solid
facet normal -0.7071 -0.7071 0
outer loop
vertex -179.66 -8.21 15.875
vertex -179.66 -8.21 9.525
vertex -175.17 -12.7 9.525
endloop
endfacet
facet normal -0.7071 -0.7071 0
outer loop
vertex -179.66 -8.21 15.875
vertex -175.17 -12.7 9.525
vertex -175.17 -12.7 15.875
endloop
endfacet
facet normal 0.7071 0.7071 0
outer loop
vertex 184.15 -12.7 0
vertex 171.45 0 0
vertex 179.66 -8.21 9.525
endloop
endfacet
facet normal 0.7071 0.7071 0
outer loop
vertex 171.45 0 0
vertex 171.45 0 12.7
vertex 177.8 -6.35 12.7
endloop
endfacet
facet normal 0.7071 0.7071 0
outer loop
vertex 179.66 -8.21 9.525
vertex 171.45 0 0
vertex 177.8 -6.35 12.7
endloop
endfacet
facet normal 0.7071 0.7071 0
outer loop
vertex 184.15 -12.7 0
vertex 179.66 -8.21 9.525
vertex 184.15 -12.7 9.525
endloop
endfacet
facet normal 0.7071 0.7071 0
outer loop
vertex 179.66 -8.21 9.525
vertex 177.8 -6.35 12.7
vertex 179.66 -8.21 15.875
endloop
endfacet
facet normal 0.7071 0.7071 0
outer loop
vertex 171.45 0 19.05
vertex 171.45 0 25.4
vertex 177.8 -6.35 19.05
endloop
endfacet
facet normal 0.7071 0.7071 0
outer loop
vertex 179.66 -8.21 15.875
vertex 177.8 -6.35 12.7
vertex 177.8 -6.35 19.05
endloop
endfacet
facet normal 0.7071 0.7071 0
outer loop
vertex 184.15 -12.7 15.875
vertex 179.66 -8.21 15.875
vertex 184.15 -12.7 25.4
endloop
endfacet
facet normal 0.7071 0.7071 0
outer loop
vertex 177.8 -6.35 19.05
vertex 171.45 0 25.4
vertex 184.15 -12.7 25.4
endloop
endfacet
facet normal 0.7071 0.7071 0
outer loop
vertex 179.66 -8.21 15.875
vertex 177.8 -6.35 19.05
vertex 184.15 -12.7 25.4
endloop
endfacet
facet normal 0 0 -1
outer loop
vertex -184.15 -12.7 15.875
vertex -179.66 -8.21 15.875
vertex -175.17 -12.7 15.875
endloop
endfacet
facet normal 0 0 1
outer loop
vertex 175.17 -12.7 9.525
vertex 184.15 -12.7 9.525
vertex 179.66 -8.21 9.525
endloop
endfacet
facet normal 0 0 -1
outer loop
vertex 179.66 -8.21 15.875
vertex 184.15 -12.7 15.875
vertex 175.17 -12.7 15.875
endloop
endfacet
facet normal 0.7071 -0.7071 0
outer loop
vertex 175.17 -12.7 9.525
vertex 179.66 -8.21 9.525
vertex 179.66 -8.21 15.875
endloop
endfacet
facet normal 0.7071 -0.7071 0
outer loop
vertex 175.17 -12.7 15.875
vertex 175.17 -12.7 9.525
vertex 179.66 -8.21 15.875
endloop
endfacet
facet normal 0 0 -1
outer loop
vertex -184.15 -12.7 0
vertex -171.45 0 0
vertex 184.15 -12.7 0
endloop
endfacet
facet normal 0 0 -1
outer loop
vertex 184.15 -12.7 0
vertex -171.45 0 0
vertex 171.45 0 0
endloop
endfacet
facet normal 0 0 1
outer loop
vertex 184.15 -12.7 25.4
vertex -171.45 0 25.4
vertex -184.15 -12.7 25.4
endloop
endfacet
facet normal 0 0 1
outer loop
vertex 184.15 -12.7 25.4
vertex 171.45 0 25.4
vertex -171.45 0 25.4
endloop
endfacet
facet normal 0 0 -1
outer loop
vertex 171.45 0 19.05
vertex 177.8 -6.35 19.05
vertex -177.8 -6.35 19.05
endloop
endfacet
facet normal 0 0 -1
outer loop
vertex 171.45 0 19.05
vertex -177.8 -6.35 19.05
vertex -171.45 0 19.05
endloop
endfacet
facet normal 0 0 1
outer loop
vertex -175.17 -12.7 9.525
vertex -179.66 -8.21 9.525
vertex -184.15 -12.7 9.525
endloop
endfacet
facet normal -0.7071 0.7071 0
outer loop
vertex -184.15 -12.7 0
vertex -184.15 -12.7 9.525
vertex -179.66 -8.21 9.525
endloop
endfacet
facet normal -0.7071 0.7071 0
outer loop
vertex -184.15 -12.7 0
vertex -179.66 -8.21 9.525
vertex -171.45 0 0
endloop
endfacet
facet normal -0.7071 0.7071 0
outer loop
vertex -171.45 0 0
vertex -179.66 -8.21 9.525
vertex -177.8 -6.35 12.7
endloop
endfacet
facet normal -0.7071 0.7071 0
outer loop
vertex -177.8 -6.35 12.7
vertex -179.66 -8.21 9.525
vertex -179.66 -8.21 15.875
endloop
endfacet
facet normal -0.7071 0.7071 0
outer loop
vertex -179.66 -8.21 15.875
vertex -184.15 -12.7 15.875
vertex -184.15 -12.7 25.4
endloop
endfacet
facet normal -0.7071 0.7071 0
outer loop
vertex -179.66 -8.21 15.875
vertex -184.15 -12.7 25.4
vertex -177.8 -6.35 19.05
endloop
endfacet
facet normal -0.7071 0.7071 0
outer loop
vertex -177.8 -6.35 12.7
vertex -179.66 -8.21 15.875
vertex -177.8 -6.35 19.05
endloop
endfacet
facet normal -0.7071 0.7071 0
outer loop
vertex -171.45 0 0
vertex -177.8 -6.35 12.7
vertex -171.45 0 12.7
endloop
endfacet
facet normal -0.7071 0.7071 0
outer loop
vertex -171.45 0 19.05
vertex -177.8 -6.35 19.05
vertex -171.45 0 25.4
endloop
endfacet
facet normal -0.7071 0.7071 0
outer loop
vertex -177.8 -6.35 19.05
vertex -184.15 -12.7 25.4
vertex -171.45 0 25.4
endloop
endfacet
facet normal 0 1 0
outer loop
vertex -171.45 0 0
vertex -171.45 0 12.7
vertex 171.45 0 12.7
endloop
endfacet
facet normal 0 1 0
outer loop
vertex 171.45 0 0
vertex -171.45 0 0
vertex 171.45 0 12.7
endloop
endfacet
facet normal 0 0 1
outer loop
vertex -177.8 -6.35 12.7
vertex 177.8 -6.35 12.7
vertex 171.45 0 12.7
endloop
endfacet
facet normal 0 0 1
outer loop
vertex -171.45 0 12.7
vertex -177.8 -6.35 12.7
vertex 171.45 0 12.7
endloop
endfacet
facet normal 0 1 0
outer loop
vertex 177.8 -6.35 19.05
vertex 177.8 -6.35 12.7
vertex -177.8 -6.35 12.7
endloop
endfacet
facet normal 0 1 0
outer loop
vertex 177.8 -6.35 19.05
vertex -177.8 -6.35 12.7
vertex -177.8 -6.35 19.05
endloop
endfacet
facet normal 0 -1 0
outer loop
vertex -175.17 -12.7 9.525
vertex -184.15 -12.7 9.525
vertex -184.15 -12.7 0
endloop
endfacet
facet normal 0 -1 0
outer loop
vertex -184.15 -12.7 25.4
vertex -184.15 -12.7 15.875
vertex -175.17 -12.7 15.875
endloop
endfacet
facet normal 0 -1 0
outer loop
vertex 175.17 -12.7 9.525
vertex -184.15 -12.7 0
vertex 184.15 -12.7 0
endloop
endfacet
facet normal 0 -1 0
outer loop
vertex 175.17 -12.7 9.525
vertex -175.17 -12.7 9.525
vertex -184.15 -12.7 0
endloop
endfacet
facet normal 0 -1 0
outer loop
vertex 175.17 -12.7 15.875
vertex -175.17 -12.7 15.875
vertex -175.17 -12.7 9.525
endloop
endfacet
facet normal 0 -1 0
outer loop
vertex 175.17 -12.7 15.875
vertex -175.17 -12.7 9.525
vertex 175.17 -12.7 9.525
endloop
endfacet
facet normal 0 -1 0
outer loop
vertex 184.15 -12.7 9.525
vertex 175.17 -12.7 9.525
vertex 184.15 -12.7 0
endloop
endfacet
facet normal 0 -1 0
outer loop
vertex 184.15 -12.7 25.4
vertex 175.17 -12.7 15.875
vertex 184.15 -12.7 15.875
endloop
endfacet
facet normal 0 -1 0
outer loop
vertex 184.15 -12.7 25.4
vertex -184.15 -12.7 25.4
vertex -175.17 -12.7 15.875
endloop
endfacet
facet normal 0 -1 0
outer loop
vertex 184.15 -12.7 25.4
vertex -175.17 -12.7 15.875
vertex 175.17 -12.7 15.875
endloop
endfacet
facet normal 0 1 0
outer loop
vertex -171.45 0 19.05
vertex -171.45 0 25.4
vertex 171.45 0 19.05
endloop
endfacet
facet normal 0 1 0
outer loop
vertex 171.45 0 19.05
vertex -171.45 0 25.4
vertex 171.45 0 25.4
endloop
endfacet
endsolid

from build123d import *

# Parameters (mm, degrees)
F0_W     = 368.3
F0_H     = 25.4
F1_DEPTH = 12.7
F2_W     = 6.35
F2_H     = 6.35
F3_DEPTH = 368.301
F5_DEPTH = 25.401
F6_W     = 6.35
F6_H     = 6.35
F7_DEPTH = 260.428428
F8_W     = 6.35
F8_H     = 6.35
F9_DEPTH = 260.428428


with BuildPart() as f1:
    # F0 (on Front) → F1 (new body)
    with BuildSketch(Plane.XZ):
        with Locations((0, 12.7)):
            Rectangle(F0_W, F0_H)
    extrude(amount=F1_DEPTH)

    # F2 (on face) → F3 (cut, through all)
    with BuildSketch(Plane.YZ.offset(184.15)):
        with Locations((-3.175, 15.875)):
            Rectangle(F2_W, F2_H)
    extrude(amount=-F3_DEPTH, mode=Mode.SUBTRACT)

    # F4 (on face) → F5 (cut, through all)
    with BuildSketch(Plane.XY.offset(25.4)):
        Polygon((-171.45, 0), (-184.15, 0), (-184.15, -12.7), align=None)
        Polygon((171.45, 0), (184.15, -12.7), (184.15, 0), align=None)
    extrude(amount=-F5_DEPTH, mode=Mode.SUBTRACT)

    # F6 (on face) → F7 (cut, through all)
    with BuildSketch(Plane(origin=(85.725, 85.725, 0), x_dir=(-0.707107, 0.707107, 0), z_dir=(0.707107, 0.707107, 0))):
        with Locations((-136.01897, 12.7)):
            Rectangle(F6_W, F6_H)
    extrude(amount=-F7_DEPTH, mode=Mode.SUBTRACT)

    # F8 (on face) → F9 (cut, through all)
    with BuildSketch(Plane(origin=(-85.725, 85.725, 0), x_dir=(-0.707107, -0.707107, 0), z_dir=(-0.707107, 0.707107, 0))):
        with Locations((136.01897, 12.7)):
            Rectangle(F8_W, F8_H)
    extrude(amount=-F9_DEPTH, mode=Mode.SUBTRACT)


solid = f1.part
